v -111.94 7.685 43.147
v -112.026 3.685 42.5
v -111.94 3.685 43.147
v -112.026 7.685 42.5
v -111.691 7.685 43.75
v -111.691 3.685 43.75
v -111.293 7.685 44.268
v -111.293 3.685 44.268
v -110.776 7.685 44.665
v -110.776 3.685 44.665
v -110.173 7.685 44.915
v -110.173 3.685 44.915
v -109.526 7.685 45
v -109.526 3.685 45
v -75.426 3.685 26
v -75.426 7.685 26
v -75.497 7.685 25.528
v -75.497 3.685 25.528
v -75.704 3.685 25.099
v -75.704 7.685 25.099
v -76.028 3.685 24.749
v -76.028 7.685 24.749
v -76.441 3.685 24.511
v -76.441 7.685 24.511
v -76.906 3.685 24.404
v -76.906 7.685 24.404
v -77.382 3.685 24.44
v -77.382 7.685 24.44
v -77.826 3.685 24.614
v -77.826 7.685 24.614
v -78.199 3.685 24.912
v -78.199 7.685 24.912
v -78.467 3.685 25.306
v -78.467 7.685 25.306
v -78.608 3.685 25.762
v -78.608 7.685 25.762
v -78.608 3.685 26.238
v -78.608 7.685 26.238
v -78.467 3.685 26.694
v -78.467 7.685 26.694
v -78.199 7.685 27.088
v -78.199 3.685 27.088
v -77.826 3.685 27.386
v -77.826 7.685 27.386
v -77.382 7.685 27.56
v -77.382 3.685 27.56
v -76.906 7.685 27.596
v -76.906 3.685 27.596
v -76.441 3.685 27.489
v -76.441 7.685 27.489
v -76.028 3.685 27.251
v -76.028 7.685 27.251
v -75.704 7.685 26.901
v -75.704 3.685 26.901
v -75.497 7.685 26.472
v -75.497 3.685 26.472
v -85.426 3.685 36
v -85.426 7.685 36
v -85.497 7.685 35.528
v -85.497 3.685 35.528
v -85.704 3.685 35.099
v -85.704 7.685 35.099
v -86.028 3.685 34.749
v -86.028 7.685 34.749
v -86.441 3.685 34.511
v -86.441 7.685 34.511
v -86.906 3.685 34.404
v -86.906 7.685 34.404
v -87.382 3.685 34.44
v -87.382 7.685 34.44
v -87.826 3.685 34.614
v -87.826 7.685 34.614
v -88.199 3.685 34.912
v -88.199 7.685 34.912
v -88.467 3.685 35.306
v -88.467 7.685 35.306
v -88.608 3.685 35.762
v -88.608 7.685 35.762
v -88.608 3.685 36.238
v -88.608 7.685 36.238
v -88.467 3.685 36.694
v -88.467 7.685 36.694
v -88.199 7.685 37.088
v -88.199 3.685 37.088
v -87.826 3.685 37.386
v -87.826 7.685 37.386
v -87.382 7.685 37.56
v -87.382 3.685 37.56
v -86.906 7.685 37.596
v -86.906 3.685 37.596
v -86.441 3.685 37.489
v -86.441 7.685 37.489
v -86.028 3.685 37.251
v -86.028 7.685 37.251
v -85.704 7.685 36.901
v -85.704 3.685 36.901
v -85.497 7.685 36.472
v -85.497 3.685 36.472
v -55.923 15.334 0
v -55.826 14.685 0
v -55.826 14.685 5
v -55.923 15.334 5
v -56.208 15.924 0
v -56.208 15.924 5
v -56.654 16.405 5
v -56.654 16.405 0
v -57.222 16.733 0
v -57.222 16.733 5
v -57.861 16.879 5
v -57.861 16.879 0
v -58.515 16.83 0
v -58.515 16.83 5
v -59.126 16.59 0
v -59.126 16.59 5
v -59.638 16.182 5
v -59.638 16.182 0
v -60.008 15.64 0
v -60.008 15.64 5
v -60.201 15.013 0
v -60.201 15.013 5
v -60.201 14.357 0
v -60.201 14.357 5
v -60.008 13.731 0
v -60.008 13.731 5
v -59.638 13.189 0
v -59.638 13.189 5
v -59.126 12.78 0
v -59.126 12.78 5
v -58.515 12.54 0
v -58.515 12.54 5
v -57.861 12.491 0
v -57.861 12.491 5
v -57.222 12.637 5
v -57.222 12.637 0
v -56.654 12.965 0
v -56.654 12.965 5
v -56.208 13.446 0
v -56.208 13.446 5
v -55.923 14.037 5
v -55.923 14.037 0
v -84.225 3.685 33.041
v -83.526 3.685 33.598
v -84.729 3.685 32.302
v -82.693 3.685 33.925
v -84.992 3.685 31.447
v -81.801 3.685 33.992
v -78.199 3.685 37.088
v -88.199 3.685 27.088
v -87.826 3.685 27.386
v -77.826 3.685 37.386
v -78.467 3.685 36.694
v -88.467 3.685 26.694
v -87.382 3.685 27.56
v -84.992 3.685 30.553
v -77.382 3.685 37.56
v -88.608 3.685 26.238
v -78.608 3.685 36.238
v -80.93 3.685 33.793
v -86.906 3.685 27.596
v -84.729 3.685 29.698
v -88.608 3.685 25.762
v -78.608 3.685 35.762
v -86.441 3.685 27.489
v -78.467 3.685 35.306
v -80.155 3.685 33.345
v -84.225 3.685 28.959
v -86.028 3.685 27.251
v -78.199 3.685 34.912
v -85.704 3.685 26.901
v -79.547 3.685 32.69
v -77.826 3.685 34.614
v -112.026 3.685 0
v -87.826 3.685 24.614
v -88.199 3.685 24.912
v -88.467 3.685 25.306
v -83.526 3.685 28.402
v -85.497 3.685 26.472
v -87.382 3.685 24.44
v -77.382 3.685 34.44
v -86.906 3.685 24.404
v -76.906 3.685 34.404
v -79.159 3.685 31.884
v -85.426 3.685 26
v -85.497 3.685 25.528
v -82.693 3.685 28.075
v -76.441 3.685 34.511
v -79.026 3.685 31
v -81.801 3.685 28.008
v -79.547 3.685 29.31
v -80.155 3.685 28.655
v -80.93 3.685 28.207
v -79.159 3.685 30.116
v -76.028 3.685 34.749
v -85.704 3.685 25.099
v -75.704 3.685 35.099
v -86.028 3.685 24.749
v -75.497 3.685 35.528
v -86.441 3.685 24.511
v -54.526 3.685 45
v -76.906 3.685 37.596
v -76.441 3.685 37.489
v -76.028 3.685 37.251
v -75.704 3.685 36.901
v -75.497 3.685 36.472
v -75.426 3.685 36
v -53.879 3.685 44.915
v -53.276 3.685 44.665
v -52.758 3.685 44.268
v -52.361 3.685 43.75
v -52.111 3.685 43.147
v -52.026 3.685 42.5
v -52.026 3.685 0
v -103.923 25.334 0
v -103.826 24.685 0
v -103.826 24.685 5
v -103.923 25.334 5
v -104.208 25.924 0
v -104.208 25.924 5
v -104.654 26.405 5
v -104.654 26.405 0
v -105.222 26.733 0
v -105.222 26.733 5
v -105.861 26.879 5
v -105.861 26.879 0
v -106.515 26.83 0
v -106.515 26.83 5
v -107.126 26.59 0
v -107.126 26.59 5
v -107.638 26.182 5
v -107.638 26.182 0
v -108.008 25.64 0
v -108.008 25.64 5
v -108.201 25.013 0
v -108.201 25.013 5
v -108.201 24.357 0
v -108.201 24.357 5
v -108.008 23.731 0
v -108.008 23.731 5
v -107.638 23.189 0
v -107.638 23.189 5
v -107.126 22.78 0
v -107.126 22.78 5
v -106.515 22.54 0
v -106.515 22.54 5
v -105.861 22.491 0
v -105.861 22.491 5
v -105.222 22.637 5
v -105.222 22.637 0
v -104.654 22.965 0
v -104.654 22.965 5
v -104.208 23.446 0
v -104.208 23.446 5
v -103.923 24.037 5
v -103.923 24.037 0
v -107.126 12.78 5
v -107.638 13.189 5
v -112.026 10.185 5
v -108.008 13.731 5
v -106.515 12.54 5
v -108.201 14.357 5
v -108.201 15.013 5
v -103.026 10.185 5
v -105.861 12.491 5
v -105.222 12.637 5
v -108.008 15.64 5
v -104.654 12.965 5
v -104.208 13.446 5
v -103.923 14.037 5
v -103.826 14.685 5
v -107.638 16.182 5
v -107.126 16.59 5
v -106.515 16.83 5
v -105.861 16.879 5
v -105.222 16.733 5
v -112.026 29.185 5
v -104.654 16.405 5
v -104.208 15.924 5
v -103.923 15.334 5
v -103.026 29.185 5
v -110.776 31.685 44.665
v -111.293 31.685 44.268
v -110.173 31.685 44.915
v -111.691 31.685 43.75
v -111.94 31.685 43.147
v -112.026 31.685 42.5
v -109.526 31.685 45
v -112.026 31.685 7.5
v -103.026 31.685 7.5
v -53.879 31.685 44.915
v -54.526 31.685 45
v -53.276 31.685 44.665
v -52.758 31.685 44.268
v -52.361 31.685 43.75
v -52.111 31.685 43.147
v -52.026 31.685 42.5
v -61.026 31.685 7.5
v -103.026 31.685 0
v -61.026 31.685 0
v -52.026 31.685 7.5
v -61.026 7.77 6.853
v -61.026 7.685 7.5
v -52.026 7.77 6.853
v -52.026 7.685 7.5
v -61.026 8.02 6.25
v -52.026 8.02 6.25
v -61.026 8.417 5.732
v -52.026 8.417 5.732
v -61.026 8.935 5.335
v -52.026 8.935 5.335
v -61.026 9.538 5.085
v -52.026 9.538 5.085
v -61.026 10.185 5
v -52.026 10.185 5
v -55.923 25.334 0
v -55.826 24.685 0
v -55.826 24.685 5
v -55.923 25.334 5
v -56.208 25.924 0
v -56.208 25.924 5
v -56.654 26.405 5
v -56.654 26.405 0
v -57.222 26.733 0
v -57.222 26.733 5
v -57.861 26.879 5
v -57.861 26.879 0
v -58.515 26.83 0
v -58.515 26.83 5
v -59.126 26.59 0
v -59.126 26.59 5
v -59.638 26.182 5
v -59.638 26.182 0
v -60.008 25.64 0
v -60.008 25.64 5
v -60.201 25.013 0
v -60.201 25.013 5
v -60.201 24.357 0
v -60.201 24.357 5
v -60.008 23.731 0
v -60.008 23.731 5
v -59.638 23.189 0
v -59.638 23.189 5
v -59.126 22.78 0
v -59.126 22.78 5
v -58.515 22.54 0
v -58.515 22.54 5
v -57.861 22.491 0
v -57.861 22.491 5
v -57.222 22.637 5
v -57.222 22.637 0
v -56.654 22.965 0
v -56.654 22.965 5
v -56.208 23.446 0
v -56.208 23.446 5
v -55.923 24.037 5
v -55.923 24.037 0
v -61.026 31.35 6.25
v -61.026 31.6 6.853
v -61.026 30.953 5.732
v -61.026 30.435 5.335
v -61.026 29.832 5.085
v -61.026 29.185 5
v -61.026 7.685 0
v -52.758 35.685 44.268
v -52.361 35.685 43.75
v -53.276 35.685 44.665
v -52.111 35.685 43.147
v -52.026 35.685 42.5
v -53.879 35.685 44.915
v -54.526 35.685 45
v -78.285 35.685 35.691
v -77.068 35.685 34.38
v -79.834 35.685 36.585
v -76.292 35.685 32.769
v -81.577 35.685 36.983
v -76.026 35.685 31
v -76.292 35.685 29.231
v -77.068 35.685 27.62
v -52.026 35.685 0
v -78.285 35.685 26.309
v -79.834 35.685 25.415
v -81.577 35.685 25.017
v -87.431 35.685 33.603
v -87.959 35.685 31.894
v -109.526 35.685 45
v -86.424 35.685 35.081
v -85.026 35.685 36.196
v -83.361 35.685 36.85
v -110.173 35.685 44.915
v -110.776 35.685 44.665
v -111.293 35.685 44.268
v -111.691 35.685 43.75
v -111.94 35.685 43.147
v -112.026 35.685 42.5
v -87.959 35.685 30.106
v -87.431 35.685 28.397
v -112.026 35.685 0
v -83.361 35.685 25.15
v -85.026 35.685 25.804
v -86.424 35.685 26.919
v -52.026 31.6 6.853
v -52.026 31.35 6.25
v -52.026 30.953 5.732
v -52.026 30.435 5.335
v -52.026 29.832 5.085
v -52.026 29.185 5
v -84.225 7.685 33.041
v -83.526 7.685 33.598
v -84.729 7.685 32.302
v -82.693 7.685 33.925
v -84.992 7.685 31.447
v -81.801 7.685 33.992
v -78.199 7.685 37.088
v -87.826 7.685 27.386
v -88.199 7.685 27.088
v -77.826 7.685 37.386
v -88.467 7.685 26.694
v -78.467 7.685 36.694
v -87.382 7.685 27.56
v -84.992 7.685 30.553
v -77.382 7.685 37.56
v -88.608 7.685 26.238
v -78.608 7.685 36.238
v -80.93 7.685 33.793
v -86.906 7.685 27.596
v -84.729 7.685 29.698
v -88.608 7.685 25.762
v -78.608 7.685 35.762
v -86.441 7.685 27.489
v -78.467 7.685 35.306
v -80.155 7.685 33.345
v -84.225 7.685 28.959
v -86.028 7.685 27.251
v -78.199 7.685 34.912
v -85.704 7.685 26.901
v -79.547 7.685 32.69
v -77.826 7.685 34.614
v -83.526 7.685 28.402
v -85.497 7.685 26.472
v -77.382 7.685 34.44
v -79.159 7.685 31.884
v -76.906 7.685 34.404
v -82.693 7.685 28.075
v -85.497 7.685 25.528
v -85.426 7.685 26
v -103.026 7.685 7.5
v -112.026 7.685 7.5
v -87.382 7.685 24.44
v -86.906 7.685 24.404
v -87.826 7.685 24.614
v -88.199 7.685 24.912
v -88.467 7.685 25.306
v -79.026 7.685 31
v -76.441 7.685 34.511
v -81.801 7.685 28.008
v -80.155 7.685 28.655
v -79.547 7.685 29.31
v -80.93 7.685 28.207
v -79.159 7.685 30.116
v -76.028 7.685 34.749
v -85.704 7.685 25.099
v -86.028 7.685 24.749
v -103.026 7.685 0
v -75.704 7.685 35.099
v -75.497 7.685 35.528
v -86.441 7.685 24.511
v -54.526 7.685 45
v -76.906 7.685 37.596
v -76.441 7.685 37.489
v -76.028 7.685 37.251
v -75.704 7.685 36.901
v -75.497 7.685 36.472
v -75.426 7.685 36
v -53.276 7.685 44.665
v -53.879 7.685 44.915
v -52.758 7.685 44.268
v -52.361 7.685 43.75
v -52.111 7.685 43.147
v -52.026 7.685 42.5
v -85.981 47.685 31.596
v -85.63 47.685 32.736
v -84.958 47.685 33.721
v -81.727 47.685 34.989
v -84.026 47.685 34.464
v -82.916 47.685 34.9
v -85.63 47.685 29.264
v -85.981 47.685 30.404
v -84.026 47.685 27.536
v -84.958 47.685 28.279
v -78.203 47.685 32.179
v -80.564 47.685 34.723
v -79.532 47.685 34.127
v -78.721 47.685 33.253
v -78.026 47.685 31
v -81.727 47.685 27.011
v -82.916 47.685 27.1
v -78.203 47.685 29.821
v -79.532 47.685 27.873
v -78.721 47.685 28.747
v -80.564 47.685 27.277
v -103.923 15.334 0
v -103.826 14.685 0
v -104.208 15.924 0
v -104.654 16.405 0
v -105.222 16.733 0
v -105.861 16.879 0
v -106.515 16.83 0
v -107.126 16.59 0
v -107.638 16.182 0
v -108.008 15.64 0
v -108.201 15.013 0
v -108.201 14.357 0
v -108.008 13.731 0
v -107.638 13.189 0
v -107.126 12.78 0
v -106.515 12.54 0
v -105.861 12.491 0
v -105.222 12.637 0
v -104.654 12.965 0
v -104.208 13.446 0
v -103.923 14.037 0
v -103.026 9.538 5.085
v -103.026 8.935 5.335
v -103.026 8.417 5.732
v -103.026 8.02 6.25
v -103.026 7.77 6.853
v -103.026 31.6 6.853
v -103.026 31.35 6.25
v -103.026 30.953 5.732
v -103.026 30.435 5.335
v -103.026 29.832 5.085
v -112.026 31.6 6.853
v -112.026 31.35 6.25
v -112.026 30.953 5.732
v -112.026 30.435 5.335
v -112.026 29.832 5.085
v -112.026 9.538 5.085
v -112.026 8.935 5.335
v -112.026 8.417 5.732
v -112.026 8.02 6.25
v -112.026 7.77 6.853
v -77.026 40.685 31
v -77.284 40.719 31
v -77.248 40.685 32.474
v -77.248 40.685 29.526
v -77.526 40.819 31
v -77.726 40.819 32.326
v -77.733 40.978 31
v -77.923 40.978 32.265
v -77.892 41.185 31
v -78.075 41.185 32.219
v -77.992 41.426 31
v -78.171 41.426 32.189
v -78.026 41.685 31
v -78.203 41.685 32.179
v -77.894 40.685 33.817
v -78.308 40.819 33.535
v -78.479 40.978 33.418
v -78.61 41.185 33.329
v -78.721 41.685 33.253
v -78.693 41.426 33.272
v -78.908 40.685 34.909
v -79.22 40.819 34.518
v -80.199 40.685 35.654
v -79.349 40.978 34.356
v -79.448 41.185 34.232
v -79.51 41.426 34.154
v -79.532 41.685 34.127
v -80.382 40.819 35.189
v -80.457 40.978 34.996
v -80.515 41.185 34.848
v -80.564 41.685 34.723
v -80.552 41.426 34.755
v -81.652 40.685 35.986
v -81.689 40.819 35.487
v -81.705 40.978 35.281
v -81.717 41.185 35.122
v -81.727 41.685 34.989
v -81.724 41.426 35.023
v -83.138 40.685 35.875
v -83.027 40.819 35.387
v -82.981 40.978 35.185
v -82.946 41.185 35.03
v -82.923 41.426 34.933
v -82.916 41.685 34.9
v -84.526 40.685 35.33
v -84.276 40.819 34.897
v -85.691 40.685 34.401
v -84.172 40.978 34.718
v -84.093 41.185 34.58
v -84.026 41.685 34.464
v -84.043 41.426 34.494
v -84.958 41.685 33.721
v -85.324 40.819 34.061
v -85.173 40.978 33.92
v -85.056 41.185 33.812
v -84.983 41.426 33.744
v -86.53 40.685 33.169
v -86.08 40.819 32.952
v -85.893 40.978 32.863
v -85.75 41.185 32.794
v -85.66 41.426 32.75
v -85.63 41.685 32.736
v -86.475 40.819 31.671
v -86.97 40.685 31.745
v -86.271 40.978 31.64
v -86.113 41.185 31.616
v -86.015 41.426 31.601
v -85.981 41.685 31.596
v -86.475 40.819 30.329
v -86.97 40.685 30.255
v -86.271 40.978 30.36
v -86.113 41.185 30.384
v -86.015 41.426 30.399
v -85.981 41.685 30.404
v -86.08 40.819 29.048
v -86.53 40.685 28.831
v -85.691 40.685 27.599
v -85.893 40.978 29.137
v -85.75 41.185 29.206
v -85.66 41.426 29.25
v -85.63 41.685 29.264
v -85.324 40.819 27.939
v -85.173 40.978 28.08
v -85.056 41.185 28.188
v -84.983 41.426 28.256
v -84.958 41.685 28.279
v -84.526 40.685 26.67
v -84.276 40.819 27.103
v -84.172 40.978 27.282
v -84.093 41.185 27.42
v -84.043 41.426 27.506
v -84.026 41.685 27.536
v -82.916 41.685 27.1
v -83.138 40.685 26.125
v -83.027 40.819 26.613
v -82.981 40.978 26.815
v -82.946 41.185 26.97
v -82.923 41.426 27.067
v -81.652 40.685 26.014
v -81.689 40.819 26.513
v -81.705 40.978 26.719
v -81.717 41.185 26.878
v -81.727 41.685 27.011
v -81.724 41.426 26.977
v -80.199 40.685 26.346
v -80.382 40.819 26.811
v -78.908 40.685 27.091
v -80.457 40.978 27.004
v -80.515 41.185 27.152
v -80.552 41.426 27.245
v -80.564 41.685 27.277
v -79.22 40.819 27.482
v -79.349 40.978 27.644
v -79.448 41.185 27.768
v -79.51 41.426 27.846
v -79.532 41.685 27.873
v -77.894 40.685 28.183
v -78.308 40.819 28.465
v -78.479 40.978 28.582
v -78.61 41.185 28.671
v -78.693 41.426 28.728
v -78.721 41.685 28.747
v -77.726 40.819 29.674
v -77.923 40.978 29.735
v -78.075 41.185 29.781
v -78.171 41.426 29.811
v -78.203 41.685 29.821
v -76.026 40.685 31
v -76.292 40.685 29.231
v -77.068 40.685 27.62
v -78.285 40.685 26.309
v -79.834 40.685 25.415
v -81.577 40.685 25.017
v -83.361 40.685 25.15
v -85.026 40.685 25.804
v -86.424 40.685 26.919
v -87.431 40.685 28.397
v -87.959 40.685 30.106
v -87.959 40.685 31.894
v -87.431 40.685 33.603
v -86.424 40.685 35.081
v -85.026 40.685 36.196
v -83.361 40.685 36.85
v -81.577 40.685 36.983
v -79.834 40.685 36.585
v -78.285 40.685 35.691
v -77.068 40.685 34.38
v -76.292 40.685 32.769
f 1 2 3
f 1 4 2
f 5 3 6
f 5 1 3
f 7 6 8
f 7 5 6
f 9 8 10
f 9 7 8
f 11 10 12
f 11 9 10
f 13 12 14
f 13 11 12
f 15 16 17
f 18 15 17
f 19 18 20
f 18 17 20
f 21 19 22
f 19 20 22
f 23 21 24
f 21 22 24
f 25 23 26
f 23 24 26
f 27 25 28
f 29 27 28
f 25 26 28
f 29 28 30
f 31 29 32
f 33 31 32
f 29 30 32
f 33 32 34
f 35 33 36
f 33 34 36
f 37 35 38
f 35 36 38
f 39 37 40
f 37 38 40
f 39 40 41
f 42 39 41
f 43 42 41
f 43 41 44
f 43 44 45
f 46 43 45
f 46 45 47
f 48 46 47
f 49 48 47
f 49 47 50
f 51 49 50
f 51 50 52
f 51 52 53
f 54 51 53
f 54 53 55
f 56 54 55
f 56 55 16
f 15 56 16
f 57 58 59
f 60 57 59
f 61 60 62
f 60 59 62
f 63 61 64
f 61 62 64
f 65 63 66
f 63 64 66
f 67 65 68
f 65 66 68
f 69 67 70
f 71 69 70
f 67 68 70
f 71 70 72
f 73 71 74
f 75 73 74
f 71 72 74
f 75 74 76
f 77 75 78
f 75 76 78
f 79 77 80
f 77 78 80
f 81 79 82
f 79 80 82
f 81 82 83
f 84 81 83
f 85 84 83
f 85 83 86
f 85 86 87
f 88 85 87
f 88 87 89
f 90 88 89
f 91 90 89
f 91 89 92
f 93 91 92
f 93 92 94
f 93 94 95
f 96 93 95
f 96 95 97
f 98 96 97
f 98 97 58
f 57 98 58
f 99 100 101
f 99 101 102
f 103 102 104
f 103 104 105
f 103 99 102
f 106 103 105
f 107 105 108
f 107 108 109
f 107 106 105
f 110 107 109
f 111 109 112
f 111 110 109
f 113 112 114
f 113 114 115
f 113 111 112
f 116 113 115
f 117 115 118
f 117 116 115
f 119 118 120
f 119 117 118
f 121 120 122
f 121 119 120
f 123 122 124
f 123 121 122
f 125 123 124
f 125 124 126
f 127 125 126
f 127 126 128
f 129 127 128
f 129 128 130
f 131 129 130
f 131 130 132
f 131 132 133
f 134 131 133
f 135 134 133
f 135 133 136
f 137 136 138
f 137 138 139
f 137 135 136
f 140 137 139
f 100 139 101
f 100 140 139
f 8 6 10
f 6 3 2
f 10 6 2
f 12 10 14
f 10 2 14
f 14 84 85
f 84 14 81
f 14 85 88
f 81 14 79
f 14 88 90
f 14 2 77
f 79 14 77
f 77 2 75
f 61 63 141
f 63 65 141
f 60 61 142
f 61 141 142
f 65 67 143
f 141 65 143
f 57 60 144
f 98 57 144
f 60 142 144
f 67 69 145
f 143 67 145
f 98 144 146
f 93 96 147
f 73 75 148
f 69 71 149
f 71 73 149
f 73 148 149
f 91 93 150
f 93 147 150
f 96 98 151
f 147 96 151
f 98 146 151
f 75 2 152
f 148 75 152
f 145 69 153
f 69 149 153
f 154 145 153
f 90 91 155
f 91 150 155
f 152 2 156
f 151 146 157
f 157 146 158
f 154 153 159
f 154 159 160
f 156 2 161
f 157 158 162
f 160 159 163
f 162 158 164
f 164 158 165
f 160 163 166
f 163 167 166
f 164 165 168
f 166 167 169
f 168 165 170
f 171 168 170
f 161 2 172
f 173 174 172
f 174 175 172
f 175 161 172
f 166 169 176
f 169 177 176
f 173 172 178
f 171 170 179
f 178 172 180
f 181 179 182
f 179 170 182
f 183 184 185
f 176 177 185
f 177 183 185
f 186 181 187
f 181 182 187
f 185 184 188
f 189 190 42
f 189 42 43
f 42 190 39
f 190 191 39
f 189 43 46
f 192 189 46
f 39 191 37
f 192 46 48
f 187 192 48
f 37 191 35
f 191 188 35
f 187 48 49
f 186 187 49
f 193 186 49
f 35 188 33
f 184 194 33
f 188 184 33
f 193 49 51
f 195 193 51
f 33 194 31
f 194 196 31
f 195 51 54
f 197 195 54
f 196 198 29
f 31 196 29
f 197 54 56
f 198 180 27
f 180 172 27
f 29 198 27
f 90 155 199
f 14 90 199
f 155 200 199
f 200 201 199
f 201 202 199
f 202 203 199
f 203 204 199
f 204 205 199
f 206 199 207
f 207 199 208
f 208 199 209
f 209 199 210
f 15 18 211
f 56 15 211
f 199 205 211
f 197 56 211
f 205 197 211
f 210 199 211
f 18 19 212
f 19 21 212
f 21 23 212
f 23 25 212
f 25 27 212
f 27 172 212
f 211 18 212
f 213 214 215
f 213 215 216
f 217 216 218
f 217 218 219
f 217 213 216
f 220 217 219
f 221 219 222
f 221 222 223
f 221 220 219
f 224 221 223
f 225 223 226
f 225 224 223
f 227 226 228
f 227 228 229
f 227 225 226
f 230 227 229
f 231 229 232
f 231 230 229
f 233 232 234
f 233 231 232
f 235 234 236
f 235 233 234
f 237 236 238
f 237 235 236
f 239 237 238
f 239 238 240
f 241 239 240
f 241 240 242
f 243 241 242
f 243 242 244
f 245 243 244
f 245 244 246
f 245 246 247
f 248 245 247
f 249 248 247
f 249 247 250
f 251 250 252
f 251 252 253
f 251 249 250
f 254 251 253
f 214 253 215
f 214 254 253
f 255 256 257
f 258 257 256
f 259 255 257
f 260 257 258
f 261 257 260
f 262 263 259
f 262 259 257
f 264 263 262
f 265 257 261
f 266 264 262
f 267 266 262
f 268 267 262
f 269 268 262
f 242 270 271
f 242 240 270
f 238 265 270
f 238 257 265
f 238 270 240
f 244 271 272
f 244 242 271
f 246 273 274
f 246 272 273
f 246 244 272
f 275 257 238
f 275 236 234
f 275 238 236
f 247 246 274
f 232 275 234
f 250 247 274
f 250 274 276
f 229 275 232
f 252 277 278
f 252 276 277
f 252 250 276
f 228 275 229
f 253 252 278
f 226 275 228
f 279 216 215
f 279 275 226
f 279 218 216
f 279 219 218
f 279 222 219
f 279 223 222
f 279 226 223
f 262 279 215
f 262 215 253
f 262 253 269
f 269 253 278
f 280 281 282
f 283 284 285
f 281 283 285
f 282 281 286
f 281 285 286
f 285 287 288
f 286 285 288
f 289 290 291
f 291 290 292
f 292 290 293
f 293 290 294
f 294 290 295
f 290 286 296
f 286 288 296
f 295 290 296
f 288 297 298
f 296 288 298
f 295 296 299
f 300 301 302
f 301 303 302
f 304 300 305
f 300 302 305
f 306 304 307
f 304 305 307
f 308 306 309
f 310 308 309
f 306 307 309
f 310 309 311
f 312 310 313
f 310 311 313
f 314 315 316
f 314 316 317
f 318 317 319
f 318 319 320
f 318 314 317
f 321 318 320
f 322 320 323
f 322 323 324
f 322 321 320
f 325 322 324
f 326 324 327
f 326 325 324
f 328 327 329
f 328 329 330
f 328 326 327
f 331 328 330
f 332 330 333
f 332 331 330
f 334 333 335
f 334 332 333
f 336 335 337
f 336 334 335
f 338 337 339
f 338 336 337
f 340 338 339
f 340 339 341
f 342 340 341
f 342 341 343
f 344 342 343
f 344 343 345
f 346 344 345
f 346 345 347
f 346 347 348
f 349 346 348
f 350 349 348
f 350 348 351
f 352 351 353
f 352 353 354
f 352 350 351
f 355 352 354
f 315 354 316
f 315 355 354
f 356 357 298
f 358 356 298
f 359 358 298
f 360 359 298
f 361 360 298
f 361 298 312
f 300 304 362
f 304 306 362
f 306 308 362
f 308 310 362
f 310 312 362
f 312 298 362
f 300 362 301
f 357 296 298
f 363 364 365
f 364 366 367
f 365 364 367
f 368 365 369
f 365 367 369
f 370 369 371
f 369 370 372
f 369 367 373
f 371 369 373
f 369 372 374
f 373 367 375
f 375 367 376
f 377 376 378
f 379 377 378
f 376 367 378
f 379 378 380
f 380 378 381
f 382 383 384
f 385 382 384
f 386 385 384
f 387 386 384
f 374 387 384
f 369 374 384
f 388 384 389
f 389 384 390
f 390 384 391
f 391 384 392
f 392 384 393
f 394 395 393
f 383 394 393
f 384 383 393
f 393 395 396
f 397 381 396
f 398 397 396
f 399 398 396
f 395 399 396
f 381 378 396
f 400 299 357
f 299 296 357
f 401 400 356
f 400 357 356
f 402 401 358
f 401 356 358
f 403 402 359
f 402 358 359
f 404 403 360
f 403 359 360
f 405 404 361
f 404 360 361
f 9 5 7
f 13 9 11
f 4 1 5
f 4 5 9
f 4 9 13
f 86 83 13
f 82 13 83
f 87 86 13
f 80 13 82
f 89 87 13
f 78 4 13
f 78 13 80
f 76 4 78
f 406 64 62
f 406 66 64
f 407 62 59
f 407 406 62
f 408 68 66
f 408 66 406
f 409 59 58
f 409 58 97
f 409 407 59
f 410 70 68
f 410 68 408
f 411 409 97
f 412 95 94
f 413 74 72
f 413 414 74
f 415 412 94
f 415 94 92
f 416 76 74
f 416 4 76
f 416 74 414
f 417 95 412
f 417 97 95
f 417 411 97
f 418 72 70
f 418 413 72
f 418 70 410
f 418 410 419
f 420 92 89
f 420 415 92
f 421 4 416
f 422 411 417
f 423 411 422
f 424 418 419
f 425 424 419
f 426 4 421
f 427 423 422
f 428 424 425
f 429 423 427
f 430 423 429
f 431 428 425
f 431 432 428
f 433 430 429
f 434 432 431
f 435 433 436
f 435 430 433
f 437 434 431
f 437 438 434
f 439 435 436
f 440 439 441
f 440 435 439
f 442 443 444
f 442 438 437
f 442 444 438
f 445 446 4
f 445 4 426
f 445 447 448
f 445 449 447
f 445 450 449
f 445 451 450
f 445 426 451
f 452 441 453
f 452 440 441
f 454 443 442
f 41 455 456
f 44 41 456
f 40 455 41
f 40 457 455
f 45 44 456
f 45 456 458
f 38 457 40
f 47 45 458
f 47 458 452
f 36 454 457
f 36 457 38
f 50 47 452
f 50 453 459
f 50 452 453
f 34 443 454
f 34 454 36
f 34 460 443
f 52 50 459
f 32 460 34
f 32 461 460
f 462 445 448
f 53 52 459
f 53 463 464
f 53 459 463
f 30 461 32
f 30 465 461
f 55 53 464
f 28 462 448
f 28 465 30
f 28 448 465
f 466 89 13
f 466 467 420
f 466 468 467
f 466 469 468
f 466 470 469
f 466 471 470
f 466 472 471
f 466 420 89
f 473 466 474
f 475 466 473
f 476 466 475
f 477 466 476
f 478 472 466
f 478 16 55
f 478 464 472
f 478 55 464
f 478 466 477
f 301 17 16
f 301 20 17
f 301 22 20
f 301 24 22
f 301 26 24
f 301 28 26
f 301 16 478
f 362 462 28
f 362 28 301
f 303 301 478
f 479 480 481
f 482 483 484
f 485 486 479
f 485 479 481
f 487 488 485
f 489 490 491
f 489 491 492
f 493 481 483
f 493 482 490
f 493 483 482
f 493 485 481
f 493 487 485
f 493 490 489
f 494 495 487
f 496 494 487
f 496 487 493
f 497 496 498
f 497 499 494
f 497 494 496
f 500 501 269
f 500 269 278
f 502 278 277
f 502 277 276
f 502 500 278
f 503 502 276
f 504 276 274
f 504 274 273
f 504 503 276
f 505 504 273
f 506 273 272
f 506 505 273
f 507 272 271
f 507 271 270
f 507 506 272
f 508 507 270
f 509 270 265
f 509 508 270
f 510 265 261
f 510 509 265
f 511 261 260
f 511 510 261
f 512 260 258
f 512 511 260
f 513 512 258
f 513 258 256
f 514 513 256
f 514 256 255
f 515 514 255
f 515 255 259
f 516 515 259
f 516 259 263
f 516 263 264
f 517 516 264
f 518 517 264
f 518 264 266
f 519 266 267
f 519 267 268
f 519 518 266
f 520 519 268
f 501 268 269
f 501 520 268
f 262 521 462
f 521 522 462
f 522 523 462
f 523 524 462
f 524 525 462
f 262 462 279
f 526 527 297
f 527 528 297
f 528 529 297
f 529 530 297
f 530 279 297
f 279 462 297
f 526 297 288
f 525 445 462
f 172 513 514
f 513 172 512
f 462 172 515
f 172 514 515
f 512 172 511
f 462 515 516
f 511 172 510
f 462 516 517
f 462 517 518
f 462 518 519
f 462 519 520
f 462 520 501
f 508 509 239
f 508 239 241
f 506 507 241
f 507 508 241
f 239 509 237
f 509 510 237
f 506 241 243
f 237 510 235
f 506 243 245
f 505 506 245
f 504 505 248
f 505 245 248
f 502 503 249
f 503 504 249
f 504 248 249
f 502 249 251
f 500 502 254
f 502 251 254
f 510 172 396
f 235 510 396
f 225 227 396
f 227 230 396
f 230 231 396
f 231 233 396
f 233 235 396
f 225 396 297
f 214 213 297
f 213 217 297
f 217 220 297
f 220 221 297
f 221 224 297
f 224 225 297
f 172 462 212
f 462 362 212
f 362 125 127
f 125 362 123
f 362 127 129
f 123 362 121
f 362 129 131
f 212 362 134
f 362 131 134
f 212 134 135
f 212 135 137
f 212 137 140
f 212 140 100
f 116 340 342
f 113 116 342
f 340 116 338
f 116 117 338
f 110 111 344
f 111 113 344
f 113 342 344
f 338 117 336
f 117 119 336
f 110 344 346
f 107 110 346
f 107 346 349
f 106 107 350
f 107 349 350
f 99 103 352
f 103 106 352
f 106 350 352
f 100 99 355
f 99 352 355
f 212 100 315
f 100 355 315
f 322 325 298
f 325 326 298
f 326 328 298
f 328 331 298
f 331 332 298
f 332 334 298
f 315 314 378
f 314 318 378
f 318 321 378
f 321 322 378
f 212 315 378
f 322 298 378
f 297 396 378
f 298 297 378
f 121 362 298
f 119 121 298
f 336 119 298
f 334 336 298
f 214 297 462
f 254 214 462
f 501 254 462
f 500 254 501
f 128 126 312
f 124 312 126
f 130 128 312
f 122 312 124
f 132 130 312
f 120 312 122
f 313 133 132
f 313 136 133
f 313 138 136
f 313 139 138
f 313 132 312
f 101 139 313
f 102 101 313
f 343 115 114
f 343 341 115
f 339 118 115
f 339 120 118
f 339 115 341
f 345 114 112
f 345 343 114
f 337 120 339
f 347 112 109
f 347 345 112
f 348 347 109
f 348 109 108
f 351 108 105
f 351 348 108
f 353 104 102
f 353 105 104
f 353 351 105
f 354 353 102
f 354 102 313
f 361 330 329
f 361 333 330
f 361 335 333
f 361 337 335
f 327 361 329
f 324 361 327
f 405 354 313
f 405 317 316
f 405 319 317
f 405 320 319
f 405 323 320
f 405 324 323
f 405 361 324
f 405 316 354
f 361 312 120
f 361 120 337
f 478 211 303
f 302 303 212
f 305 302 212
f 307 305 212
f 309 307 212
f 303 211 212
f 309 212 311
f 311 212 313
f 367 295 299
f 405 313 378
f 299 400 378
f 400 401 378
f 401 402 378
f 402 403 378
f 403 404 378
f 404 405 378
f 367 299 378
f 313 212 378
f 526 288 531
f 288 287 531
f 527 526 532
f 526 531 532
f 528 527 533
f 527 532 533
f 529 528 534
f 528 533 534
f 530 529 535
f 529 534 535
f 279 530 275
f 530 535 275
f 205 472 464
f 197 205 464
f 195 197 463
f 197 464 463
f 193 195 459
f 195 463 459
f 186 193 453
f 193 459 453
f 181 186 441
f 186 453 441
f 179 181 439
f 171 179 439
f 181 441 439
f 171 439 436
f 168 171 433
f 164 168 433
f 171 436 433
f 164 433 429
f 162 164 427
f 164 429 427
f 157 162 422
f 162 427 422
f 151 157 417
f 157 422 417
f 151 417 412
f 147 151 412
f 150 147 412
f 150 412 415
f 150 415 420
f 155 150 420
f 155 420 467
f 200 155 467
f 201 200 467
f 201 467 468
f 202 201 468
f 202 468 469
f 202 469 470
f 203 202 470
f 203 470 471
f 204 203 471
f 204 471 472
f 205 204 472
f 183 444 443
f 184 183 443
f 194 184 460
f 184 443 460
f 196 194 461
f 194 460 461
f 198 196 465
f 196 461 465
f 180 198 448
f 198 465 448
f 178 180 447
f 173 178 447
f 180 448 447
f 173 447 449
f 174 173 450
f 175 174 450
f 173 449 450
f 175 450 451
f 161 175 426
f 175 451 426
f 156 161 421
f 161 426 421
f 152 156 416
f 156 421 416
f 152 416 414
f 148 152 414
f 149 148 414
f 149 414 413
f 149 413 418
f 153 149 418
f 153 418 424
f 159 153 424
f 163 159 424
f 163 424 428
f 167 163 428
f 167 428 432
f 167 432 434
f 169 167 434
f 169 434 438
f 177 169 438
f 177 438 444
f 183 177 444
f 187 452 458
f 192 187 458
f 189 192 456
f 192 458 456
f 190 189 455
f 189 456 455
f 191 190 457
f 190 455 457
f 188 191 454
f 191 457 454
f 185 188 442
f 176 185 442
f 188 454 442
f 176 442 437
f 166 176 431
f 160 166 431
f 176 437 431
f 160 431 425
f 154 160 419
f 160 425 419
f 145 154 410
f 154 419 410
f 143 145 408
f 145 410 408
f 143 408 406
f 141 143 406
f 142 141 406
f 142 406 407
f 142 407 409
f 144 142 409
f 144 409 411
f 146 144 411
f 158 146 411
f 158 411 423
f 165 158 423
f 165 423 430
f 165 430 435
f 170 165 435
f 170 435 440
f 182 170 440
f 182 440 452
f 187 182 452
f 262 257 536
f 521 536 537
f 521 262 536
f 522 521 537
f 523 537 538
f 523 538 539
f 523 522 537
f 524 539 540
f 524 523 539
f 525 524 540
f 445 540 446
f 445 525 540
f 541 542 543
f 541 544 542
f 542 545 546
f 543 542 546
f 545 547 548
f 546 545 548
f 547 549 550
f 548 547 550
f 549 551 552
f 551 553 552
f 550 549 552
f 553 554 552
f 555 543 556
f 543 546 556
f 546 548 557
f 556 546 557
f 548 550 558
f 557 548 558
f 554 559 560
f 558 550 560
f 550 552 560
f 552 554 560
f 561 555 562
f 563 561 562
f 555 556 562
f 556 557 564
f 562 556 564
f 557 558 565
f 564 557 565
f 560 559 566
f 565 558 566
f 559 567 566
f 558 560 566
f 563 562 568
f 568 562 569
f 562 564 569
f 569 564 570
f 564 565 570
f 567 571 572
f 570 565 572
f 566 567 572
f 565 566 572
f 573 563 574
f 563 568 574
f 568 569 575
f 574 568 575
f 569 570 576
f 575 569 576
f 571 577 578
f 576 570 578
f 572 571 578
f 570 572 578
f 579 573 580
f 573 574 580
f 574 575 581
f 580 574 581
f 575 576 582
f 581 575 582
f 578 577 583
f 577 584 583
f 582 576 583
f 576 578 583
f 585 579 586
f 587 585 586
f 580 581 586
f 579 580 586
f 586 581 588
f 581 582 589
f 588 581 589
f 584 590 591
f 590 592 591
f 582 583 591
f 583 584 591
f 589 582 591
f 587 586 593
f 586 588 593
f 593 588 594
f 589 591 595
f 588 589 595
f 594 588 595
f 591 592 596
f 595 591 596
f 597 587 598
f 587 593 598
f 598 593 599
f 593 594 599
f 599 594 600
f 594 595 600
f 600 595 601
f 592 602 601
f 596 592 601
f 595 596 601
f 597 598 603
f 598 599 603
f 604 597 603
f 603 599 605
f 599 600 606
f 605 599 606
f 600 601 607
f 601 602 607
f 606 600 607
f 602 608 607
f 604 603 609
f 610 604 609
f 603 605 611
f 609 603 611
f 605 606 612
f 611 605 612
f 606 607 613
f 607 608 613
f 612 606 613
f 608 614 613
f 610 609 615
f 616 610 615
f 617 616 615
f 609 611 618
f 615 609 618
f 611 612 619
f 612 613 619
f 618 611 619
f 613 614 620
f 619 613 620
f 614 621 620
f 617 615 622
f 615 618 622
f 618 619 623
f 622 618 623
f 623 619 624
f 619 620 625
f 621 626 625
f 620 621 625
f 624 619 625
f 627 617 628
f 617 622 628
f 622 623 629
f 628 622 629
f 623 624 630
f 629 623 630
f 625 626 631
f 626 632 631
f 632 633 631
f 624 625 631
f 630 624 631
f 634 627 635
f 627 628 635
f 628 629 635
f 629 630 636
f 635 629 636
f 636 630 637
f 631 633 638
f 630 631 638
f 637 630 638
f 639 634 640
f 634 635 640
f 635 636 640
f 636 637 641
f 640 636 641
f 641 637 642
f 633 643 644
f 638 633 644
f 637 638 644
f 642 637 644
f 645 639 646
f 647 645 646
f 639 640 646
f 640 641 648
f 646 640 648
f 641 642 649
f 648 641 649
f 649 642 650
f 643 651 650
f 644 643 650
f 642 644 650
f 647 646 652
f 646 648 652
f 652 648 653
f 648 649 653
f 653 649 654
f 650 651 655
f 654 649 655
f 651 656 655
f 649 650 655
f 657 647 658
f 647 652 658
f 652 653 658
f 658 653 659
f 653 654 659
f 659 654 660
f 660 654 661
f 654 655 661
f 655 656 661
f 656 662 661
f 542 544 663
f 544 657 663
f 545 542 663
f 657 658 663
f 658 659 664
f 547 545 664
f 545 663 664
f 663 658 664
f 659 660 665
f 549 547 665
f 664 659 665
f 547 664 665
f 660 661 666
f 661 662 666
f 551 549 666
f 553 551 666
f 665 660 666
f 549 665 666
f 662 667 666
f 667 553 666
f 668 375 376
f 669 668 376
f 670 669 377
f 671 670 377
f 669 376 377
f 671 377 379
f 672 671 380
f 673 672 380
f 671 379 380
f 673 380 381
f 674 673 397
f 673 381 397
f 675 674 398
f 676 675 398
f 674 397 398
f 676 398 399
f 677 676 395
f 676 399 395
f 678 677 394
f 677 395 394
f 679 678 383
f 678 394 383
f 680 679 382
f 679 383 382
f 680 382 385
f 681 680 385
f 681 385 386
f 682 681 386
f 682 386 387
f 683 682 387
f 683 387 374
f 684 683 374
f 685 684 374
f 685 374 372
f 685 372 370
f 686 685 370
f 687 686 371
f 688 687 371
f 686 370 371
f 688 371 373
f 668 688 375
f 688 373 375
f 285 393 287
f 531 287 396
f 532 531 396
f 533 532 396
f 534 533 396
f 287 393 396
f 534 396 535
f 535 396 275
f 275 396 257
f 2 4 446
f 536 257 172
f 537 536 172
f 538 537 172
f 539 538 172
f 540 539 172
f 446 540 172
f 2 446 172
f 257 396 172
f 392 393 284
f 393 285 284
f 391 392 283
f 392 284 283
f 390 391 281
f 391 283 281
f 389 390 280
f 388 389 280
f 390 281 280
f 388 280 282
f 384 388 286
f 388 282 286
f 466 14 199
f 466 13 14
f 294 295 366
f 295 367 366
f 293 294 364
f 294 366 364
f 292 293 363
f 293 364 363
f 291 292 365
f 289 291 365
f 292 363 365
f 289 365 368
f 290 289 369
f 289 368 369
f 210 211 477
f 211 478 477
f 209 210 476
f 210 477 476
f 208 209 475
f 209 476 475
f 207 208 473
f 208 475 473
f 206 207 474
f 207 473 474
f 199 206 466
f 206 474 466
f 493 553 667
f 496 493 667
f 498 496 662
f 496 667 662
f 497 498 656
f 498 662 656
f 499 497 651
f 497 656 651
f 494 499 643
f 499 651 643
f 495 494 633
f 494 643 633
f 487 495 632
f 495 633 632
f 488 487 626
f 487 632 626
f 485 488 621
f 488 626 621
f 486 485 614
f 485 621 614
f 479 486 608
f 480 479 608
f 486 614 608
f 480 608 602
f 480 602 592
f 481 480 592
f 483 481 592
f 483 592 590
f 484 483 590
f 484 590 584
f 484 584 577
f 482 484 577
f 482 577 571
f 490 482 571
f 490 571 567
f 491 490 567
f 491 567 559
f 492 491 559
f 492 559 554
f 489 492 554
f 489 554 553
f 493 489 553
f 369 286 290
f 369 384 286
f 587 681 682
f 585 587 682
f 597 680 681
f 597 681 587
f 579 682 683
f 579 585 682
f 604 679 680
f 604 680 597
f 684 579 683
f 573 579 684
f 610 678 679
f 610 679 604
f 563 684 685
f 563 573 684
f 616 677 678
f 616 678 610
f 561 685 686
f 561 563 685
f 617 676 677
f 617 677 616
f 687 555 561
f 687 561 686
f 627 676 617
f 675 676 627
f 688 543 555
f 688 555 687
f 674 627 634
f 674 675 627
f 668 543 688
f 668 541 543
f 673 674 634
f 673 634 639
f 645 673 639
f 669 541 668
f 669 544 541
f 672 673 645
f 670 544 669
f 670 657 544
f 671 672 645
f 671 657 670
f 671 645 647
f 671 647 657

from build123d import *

# Parameters (mm, degrees)
SKETCH1_W           = 60
SKETCH1_H           = 4
BOSS_EXTRUDE1_DEPTH = 45
SKETCH1_3_W         = 9
SKETCH1_3_H         = 24
SKETCH1_3_R         = 2.2
BOSS_EXTRUDE2_DEPTH = 5
SKETCH2_R           = 3
SKETCH2_R_2         = 1.6
CUT_EXTRUDE1_DEPTH  = 124.088359511
BOSS_EXTRUDE3_DEPTH = 45
FILLET1_R           = 2.5
FILLET3_R           = 2.5
SKETCH3_R           = 4
BOSS_EXTRUDE4_DEPTH = 12
SKETCH4_R           = 6
BOSS_EXTRUDE5_DEPTH = 5
FILLET4_R           = 1


with BuildPart() as part:
    # Sketch1 → Boss-Extrude1 (new body)
    with BuildSketch(Plane.XY):
        with Locations((-82.025641026, 5.685176195)):
            Rectangle(SKETCH1_W, SKETCH1_H)
    extrude(amount=BOSS_EXTRUDE1_DEPTH)

    # Sketch1<3> → Boss-Extrude2 (add)
    # profile 1 of 2: a face of its own
    with BuildSketch(Plane.XY):
        with Locations((-107.525641026, 19.685176195)):
            Rectangle(SKETCH1_3_W, SKETCH1_3_H)
        with Locations((-106.025641026, 14.685176195)):
            Circle(SKETCH1_3_R, mode=Mode.SUBTRACT)
        with Locations((-106.025641026, 24.685176195)):
            Circle(SKETCH1_3_R, mode=Mode.SUBTRACT)
    # profile 2 of 2: a face of its own
    with BuildSketch(Plane.XY):
        with Locations((-56.525641026, 19.685176195)):
            Rectangle(SKETCH1_3_W, SKETCH1_3_H)
        with Locations((-58.025641026, 14.685176195)):
            Circle(SKETCH1_3_R, mode=Mode.SUBTRACT)
        with Locations((-58.025641026, 24.685176195)):
            Circle(SKETCH1_3_R, mode=Mode.SUBTRACT)
    extrude(amount=BOSS_EXTRUDE2_DEPTH)

    # Sketch2 → Cut-Extrude1 (cut, through all)
    with BuildSketch(Plane(origin=(0, 7.685176195, 0), x_dir=(1, 0, 0), z_dir=(0, 1, 0))):
        with Locations((-82.025641026, -31)):
            Circle(SKETCH2_R)
        with Locations((-77.025641026, -26)):
            Circle(SKETCH2_R_2)
        with Locations((-87.025641026, -26)):
            Circle(SKETCH2_R_2)
        with Locations((-77.025641026, -36)):
            Circle(SKETCH2_R_2)
        with Locations((-87.025641026, -36)):
            Circle(SKETCH2_R_2)
    extrude(amount=-CUT_EXTRUDE1_DEPTH, mode=Mode.SUBTRACT)

    # Sketch1<4> → Boss-Extrude3 (add)
    with BuildSketch(Plane.XY):
        Polygon((-112.025641026, 35.685176195), (-112.025641026, 31.685176195), (-103.025641026, 31.685176195), (-61.025641026, 31.685176195), (-52.025641026, 31.685176195), (-52.025641026, 35.685176195), align=None)
    extrude(amount=BOSS_EXTRUDE3_DEPTH)

    # Fillet1
    fillet1_edges = [part.edges().sort_by_distance(p)[0] for p in [
        (-52.025641026, 5.685176195, 45),
        (-112.025641026, 5.685176195, 45),
        (-52.025641026, 33.685176195, 45),
        (-112.025641026, 33.685176195, 45),
    ]]
    fillet(fillet1_edges, radius=FILLET1_R)

    # Fillet3
    fillet3_edges = [part.edges().sort_by_distance(p)[0] for p in [
        (-107.525641026, 7.685176195, 5),
        (-56.525641026, 7.685176195, 5),
        (-56.525641026, 31.685176195, 5),
        (-107.525641026, 31.685176195, 5),
    ]]
    fillet(fillet3_edges, radius=FILLET3_R)

    # Sketch3 → Boss-Extrude4 (add)
    with BuildSketch(Plane(origin=(0, 35.685176195, 0), x_dir=(1, 0, 0), z_dir=(0, 1, 0))):
        with Locations((-82.025641026, -31)):
            Circle(SKETCH3_R)
    extrude(amount=BOSS_EXTRUDE4_DEPTH)

    # Sketch4 → Boss-Extrude5 (add)
    with BuildSketch(Plane(origin=(0, 35.685176195, 0), x_dir=(1, 0, 0), z_dir=(0, 1, 0))):
        with Locations((-82.025641026, -31)):
            Circle(SKETCH4_R)
    extrude(amount=BOSS_EXTRUDE5_DEPTH)

    # Fillet4
    fillet4_edges = [part.edges().sort_by_distance(p)[0] for p in [
        (-86.025641026, 40.685176195, 31),
    ]]
    fillet(fillet4_edges, radius=FILLET4_R)


solid = part.part
